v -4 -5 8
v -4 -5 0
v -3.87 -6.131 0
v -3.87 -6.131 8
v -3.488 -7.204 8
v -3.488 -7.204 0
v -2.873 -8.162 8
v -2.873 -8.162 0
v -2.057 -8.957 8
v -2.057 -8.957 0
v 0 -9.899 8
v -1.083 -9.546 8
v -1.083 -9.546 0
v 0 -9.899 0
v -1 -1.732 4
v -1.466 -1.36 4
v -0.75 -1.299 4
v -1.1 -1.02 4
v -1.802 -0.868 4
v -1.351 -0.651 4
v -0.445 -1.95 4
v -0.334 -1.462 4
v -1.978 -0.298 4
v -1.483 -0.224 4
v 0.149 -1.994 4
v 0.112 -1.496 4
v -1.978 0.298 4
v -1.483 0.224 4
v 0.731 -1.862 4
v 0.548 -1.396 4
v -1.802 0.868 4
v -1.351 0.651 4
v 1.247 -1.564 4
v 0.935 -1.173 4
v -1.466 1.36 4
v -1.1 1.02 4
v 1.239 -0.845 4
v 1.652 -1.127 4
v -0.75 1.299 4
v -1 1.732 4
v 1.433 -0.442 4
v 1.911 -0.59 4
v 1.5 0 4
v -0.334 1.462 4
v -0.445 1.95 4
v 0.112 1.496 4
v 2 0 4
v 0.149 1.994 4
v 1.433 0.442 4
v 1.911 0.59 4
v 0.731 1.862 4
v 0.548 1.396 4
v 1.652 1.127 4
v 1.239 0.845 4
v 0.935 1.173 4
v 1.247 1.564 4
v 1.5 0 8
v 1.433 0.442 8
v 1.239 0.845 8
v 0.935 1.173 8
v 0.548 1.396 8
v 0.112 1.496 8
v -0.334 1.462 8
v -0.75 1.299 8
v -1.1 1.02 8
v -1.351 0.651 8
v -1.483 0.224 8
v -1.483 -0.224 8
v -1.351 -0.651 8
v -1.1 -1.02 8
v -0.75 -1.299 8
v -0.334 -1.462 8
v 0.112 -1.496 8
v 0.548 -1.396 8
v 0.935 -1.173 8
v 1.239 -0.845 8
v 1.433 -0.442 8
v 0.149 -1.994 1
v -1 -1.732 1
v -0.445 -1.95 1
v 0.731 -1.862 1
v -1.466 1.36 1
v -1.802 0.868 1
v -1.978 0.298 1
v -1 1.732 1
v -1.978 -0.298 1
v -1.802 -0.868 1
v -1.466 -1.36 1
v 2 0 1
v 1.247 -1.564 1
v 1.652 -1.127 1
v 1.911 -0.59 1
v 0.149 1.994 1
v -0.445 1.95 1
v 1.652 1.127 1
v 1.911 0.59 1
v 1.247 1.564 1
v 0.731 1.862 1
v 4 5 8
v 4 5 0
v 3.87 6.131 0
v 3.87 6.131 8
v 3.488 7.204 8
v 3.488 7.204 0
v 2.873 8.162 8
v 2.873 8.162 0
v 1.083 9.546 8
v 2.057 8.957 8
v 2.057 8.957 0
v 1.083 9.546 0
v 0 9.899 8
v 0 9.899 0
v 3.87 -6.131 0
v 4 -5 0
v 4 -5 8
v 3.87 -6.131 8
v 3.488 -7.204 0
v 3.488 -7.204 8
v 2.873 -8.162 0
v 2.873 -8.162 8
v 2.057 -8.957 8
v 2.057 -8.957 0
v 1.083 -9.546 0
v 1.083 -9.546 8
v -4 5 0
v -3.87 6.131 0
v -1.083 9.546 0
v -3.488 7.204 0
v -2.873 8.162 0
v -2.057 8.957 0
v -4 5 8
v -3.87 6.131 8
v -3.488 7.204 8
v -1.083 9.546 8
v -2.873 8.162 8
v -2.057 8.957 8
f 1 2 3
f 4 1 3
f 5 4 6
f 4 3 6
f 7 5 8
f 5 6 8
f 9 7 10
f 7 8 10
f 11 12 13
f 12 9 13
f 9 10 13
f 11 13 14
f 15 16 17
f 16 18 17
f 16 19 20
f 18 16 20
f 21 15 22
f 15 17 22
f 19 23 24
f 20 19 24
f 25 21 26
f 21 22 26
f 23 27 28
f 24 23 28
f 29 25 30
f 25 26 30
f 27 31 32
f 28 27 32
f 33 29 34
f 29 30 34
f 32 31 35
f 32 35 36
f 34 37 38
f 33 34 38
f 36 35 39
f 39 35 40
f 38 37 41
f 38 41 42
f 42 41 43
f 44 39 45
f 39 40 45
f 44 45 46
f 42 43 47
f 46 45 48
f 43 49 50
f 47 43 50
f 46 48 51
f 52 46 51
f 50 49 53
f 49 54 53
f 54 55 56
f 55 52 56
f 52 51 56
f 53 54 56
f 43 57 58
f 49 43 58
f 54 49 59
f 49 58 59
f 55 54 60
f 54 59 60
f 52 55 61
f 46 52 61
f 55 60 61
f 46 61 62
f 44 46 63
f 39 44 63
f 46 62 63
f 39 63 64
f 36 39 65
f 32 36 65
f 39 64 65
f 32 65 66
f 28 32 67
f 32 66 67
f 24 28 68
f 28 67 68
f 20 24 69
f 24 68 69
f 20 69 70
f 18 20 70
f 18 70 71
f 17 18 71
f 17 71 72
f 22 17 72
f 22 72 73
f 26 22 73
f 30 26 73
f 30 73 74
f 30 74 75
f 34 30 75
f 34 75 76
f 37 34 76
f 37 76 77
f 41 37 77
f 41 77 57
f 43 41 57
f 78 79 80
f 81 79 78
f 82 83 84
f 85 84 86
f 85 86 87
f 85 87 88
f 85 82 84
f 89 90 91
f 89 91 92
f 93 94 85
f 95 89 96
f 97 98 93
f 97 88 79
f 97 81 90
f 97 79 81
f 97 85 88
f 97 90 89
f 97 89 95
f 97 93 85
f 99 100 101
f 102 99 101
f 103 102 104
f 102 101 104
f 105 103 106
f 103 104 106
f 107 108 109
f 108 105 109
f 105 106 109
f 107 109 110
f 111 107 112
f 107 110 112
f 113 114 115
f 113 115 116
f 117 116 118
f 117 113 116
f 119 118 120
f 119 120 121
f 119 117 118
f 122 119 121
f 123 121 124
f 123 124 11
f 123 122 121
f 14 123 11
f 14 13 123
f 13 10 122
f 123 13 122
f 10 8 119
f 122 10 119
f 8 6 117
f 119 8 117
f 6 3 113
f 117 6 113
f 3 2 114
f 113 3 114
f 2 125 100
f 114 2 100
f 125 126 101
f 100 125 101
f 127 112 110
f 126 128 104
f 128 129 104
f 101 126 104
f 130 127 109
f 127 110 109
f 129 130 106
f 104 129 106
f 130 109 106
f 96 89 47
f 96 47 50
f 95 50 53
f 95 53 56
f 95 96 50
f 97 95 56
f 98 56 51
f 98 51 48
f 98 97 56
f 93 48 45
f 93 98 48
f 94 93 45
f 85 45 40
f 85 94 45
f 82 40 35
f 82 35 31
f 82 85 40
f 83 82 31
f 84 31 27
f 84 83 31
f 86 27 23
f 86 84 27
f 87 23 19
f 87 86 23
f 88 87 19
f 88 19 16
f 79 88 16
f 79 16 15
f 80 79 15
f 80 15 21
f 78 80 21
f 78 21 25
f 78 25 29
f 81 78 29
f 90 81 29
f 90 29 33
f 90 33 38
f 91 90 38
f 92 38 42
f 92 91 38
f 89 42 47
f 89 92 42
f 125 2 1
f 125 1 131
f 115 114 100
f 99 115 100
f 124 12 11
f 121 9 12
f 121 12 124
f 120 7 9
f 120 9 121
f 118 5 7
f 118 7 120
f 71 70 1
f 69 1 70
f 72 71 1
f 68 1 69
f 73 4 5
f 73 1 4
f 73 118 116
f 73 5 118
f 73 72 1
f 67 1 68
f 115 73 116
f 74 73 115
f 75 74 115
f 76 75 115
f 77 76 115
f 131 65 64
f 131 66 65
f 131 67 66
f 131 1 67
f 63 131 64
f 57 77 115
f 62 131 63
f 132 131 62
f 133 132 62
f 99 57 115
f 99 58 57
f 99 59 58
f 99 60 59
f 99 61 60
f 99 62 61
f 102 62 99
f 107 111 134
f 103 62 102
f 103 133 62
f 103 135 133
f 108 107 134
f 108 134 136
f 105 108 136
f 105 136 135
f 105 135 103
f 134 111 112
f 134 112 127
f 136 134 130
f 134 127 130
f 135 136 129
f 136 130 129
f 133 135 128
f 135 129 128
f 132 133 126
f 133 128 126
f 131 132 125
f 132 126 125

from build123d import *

# Parameters (mm, degrees)
F0_W        = 8
F0_H        = 20
F1_DEPTH    = 8
F2_T1_DEPTH = 33
F3_R        = 1.5
F4_DEPTH    = 7
F5_R        = 2
F5_R_2      = 1.5
F6_DEPTH    = 3


# Not quite as in the source:
# - a fillet or chamfer that OpenCascade refuses, or shapes differently, is made with other operations: its cross-section is extruded or revolved along the edge and cut away or added


with BuildPart() as f1:
    # F0 (on Top) → F1 (new body)
    with BuildSketch(Plane.XY):
        Rectangle(F0_W, F0_H)
    extrude(amount=F1_DEPTH)

    # F2: fillet of radius 5 on 4 edges, made by hand

    # F2_s2 → F2_t1 (cut)
    with BuildSketch(Plane.XY.offset(-12.5)):
        with BuildLine():
            ThreePointArc((4, -5), (2.5355339059, -8.5355339059), (-1, -10))
            Line((-1, -10), (4, -10))
            Line((4, -10), (4, -5))
        make_face()
        with BuildLine():
            ThreePointArc((-4, -5), (-2.5355339059, -8.5355339059), (1, -10))
            Line((1, -10), (-4, -10))
            Line((-4, -10), (-4, -5))
        make_face()
        with BuildLine():
            ThreePointArc((4, 5), (2.5355339059, 8.5355339059), (-1, 10))
            Line((-1, 10), (4, 10))
            Line((4, 10), (4, 5))
        make_face()
        with BuildLine():
            ThreePointArc((1, 10), (-2.5355339059, 8.5355339059), (-4, 5))
            Line((-4, 5), (-4, 10))
            Line((-4, 10), (1, 10))
        make_face()
    extrude(amount=F2_T1_DEPTH, mode=Mode.SUBTRACT)

    # F3 (on face) → F4 (cut)
    with BuildSketch(Plane.XY.offset(8)):
        Circle(F3_R)
    extrude(amount=-F4_DEPTH, mode=Mode.SUBTRACT)

    # F5 (on face) → F6 (cut)
    with BuildSketch(Plane.XY.offset(1)):
        Circle(F5_R)
        Circle(F5_R_2, mode=Mode.SUBTRACT)
    extrude(amount=F6_DEPTH, mode=Mode.SUBTRACT)


solid = f1.part
